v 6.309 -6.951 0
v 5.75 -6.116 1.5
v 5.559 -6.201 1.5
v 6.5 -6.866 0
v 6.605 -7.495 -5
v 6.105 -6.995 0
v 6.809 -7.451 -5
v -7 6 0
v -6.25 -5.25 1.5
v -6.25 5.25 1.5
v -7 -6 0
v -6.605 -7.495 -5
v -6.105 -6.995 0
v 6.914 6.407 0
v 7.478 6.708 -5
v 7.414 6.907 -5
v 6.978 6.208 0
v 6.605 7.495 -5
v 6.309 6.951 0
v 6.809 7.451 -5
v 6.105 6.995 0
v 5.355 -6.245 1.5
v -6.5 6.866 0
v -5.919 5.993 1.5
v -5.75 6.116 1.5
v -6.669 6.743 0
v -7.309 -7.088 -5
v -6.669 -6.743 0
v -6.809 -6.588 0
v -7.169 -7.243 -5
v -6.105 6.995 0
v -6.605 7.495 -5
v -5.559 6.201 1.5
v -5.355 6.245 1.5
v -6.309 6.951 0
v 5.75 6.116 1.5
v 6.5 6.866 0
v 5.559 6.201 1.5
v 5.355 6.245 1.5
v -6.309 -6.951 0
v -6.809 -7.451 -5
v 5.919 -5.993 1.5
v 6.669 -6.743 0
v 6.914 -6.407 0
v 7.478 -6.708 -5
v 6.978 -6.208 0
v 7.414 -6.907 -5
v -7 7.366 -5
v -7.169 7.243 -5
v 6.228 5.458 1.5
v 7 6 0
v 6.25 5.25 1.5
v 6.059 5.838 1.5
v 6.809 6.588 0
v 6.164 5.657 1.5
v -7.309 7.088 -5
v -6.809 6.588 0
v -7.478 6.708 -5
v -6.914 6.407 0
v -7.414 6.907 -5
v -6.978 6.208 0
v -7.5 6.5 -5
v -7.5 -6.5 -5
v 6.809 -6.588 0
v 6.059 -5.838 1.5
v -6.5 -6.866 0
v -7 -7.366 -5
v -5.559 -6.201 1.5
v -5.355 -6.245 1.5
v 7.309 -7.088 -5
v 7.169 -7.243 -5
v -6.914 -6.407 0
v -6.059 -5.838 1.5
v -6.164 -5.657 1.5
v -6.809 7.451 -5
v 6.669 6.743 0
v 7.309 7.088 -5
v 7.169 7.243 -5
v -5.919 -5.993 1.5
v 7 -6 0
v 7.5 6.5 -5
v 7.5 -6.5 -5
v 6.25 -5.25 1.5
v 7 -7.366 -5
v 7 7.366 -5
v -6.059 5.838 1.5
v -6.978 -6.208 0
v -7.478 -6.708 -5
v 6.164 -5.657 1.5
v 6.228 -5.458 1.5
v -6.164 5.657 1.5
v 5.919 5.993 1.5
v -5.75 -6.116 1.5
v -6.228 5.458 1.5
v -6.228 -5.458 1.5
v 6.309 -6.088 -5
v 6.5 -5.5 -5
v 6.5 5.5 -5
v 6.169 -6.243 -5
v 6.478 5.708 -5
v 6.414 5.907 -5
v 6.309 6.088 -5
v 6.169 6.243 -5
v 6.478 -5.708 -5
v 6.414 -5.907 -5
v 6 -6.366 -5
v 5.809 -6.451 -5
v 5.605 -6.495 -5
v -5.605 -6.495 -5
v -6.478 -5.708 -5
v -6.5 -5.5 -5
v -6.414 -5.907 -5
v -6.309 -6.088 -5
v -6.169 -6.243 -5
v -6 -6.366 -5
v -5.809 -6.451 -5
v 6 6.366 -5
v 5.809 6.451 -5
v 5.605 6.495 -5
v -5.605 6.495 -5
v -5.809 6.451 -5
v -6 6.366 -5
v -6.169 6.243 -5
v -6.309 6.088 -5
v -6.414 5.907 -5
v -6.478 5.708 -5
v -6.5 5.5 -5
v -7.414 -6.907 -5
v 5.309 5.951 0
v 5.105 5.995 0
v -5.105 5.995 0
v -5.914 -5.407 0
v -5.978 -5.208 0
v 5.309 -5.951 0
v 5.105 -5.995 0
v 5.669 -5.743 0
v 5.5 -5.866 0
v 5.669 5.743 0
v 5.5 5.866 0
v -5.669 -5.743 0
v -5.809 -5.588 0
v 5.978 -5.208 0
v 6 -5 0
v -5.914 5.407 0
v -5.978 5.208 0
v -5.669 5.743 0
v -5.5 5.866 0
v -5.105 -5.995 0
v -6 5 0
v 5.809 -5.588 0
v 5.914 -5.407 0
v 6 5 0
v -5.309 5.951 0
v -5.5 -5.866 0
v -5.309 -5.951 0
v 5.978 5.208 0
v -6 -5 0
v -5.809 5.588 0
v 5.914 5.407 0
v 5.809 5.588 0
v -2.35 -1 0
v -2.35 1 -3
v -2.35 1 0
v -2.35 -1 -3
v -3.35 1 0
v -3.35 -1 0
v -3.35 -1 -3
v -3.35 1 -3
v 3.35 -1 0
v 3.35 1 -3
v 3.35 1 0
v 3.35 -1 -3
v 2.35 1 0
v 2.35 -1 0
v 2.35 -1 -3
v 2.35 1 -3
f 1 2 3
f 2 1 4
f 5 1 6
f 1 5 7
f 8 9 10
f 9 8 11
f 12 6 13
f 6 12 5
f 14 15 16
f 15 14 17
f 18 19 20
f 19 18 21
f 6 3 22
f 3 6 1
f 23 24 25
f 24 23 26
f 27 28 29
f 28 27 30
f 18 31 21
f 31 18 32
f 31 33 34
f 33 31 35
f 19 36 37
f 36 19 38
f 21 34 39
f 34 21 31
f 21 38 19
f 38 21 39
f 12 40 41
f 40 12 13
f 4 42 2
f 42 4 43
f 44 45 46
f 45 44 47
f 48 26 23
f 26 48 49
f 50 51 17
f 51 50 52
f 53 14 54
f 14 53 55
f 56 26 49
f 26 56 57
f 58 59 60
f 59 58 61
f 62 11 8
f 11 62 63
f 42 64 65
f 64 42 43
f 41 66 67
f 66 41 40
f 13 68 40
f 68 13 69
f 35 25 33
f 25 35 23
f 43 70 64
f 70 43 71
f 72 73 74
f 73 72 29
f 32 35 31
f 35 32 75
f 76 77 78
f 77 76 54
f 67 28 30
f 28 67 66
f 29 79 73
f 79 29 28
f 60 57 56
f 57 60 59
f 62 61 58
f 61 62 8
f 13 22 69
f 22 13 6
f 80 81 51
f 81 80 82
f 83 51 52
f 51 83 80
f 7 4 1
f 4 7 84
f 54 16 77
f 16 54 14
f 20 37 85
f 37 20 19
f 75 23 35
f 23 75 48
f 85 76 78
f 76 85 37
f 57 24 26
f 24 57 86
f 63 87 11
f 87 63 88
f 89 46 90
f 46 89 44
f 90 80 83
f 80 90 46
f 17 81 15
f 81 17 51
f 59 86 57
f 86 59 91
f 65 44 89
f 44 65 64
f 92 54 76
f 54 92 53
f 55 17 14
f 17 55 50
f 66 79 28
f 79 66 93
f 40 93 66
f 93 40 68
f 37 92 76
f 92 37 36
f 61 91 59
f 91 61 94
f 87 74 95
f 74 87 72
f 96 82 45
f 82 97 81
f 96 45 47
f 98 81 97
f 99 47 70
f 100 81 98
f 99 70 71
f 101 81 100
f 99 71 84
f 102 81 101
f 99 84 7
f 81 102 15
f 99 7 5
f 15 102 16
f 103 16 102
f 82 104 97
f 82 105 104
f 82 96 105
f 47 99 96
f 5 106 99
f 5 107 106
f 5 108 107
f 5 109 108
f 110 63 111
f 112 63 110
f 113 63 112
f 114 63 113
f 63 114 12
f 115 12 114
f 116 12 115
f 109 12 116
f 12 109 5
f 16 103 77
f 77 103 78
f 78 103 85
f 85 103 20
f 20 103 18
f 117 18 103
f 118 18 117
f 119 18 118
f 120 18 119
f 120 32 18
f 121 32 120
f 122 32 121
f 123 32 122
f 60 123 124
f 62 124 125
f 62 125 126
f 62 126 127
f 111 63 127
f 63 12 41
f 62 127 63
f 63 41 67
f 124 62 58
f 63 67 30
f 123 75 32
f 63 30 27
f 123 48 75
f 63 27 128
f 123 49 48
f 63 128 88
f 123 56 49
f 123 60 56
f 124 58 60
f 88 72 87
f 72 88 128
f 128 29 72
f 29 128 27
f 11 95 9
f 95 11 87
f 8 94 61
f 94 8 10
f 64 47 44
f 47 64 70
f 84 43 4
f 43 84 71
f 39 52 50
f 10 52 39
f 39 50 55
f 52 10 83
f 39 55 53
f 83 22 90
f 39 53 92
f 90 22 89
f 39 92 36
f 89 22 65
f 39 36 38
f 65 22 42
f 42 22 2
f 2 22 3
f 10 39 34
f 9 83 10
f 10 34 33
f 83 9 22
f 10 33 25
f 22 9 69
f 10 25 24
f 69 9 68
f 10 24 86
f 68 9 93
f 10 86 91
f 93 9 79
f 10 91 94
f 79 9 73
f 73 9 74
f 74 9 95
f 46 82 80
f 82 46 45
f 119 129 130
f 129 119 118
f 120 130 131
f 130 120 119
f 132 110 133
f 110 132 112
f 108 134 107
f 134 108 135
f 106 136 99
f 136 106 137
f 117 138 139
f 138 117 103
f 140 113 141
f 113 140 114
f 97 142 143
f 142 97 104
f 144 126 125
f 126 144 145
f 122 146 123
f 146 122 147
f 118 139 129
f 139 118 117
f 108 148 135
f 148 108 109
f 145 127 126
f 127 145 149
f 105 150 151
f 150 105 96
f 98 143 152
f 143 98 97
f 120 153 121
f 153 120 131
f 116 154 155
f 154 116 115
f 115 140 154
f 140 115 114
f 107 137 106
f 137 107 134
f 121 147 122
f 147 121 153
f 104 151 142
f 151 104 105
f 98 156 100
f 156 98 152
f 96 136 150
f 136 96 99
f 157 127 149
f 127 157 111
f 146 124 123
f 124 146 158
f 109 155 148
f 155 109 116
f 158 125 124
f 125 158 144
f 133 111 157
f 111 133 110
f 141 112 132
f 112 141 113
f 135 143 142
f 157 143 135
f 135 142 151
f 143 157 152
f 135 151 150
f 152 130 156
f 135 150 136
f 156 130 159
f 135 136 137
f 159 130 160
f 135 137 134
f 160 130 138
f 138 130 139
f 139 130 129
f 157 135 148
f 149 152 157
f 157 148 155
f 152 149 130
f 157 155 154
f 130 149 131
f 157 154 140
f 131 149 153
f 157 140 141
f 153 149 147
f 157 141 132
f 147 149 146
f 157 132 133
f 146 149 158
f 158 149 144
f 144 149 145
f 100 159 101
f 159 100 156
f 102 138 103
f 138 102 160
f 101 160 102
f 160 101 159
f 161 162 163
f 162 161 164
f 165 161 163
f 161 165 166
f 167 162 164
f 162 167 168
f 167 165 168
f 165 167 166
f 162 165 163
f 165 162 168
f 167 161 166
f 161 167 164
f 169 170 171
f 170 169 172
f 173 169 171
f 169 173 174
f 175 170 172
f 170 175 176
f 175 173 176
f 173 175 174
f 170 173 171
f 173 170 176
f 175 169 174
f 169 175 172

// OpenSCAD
$fs = 0.1;

module rounded_plate (x, y, r) {
  thickness = 0.0001;
  minkowski () {
    cube([x-r*2, y-r*2, thickness], center = true);
    cylinder(r = r, h = thickness);
  }
}

module keycap1_outer_shape (bottom_size, middle_size, top_size, head_height, skert_height) {
    hull () {
        translate([0, 0, head_height])
        rounded_plate(top_size, top_size, 1);
        
        translate([0, 0, 0])
        rounded_plate(middle_size, middle_size, 1);
        
        translate([0, 0, -skert_height])
        rounded_plate(bottom_size, bottom_size, 1);
    }
}

module keycap_shape () {
  thickness = 1.0;
  
  head_height = 1.5;
  bottom_size = 15;
  middle_size = 14;
  top_size = 12.5;
  head_height = 1.5;
  skert_height = 5.0; 
  
  difference () {
    // 外形
    keycap1_outer_shape(bottom_size, middle_size, top_size, head_height, skert_height);
    // くり抜くための外形
    keycap1_outer_shape(bottom_size - thickness * 2, middle_size - thickness * 2, top_size - thickness * 2, 0, skert_height);
  }
}

keycap_shape();


module kailh_choc_v1_stem() {
    translate([-2.85, 0, -3/2])
    cube([1, 2, 3], center=true);
    translate([2.85, 0, -3/2])
    cube([1, 2, 3], center=true);
}

kailh_choc_v1_stem();
